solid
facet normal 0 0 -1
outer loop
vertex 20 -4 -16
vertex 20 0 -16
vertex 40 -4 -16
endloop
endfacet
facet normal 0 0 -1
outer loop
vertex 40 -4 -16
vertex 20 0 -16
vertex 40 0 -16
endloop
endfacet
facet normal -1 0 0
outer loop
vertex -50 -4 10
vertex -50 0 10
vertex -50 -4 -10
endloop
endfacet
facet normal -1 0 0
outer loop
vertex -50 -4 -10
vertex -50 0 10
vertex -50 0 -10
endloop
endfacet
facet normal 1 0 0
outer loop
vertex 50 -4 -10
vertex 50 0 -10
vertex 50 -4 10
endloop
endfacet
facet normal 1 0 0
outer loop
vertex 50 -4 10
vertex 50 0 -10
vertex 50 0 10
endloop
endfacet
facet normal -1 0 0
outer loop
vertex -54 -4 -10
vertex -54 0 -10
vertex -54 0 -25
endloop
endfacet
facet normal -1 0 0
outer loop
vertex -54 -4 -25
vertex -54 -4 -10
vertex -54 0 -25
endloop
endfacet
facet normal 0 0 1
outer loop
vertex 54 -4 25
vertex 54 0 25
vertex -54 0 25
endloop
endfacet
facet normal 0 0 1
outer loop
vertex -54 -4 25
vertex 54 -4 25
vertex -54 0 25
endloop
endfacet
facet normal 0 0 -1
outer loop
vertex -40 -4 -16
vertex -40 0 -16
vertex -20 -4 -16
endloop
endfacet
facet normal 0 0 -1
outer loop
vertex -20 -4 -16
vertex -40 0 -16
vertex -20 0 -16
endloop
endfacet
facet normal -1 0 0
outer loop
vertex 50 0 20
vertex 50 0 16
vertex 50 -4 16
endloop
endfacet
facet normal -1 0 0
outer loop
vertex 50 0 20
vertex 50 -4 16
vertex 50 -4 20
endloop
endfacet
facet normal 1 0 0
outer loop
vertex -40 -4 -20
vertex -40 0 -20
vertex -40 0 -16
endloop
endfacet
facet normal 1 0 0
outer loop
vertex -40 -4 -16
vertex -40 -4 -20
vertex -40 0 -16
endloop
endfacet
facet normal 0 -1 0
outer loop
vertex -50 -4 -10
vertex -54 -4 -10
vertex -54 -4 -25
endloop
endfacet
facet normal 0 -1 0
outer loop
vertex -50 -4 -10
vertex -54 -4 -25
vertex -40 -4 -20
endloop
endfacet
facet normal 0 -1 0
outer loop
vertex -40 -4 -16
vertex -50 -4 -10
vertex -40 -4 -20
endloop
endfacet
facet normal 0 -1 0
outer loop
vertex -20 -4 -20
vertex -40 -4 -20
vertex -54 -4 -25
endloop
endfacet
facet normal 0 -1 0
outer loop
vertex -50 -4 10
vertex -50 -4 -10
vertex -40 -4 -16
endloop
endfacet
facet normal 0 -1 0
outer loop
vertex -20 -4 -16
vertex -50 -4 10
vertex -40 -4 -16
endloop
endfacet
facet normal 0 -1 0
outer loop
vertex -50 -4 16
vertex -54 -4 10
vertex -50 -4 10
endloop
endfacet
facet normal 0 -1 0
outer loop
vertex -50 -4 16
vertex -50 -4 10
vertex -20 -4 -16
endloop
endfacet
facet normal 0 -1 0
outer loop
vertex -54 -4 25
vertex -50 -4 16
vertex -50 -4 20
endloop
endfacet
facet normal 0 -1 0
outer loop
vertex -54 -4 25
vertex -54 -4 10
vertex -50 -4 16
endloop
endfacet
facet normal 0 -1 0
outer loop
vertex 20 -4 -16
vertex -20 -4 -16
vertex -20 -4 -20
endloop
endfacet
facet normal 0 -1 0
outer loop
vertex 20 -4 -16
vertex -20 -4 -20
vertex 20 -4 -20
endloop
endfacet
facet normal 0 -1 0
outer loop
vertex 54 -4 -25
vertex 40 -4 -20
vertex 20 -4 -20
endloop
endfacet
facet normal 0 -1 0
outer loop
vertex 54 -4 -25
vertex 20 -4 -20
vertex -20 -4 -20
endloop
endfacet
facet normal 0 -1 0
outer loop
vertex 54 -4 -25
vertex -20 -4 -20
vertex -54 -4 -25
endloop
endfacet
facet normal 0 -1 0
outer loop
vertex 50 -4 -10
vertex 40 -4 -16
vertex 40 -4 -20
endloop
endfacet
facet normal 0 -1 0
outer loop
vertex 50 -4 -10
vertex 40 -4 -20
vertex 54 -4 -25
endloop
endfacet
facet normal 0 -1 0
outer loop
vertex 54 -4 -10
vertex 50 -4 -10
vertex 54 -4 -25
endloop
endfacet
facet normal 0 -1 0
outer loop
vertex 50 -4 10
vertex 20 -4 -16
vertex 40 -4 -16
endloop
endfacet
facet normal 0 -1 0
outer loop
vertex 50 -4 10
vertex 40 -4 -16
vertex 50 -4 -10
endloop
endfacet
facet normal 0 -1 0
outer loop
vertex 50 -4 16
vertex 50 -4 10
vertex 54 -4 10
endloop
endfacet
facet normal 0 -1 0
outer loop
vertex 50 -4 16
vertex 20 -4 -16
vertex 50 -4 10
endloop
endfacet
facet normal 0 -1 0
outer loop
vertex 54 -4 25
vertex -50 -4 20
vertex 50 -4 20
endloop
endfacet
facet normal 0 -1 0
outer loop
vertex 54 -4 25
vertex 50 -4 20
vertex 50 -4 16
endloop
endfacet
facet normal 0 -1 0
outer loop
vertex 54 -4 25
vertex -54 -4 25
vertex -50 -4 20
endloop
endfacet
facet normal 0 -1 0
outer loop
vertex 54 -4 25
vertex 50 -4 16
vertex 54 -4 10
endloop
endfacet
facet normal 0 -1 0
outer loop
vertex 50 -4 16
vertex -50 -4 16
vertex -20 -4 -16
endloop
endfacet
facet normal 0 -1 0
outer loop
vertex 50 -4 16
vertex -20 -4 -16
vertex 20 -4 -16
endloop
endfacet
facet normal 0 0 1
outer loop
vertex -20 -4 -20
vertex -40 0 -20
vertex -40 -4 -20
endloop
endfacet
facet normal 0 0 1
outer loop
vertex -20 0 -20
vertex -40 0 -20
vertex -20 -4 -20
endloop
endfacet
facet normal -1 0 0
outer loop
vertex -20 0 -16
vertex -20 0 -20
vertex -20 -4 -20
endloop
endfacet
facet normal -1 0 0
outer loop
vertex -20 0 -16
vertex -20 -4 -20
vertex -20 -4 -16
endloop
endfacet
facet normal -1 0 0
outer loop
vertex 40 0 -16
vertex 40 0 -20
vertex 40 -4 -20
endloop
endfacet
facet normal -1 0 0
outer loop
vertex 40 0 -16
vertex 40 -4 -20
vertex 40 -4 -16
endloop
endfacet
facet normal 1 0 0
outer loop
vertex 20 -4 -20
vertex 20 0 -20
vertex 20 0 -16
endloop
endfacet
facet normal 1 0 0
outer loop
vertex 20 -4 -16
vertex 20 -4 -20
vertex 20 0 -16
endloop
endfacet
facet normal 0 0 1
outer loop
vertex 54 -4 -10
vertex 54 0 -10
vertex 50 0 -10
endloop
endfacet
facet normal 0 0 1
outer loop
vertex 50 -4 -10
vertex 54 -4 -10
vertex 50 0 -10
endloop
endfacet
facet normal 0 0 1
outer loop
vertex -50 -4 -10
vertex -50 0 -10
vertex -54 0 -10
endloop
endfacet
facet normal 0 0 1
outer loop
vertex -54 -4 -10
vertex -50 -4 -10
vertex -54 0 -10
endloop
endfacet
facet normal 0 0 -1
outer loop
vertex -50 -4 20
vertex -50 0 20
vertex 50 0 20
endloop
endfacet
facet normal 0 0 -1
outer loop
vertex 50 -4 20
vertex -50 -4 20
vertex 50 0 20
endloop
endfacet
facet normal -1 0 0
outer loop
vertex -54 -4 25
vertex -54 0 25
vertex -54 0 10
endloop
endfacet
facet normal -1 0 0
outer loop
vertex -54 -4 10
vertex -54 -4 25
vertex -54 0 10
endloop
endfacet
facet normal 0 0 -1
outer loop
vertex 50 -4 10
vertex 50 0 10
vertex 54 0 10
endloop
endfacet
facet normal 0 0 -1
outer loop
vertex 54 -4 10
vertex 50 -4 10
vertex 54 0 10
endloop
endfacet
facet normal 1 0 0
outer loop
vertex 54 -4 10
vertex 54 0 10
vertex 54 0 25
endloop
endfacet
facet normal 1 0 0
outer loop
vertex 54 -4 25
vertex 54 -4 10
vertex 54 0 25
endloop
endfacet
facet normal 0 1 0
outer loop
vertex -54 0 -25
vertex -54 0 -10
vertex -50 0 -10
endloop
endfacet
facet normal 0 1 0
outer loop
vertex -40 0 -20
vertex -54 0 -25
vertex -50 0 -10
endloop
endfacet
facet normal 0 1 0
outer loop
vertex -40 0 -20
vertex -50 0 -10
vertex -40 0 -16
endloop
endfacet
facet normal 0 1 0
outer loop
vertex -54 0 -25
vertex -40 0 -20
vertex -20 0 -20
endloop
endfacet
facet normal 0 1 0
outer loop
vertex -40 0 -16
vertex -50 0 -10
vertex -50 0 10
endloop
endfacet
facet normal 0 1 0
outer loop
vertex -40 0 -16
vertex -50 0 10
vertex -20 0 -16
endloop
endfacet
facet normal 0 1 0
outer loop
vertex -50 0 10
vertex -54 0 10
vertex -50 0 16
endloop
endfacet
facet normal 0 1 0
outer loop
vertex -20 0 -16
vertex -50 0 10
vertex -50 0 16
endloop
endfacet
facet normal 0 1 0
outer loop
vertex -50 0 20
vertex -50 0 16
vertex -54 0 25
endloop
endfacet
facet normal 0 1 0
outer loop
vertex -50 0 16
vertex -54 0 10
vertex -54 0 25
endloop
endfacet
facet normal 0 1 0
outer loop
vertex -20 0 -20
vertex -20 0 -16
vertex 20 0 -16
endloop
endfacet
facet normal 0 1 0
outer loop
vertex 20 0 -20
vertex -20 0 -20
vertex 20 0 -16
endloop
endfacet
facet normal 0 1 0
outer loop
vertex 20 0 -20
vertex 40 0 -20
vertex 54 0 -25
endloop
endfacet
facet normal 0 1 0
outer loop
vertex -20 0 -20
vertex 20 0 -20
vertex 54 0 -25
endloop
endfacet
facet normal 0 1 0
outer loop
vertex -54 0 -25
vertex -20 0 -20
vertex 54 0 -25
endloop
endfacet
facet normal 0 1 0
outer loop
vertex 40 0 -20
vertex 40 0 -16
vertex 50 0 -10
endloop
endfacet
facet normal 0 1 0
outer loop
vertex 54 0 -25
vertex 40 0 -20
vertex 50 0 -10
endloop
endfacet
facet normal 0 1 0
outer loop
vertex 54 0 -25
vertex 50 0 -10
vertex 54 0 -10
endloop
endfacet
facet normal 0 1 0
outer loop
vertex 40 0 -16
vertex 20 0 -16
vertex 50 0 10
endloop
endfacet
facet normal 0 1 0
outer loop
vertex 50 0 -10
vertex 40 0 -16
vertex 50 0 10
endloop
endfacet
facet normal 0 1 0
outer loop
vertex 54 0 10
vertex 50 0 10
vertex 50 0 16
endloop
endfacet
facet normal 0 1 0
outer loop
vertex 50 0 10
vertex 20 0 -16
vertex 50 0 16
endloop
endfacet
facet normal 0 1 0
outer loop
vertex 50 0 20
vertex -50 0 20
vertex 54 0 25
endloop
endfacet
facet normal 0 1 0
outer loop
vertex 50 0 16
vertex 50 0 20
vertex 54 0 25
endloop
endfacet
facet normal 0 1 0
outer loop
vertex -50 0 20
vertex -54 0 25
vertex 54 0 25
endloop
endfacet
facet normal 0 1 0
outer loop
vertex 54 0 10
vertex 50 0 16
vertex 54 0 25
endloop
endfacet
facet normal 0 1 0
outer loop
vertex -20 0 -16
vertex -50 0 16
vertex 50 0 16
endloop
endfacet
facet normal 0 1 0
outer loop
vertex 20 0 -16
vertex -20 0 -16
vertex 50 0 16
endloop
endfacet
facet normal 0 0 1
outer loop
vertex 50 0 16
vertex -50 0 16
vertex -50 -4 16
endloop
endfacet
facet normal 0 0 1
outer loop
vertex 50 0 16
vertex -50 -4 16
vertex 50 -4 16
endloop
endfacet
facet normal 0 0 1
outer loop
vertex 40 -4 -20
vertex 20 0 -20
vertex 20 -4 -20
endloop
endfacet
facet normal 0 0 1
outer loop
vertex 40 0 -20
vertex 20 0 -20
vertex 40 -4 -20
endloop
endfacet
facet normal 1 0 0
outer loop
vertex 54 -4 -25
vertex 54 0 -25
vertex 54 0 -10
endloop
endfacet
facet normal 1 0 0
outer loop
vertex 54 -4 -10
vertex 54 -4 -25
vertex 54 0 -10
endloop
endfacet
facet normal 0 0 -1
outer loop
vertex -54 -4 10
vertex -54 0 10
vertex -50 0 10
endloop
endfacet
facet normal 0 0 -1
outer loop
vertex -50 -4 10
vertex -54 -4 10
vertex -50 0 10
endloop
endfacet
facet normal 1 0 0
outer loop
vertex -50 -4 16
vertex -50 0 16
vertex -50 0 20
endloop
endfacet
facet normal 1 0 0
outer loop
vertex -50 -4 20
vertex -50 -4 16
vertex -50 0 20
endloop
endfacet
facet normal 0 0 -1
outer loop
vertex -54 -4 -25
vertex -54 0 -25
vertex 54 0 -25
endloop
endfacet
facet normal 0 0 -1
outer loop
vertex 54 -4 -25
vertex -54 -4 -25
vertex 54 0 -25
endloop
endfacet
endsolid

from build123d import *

# Parameters (mm, degrees)
F0_W     = 20
F0_H     = 4
F0_W_2   = 100
F1_DEPTH = 4


with BuildPart() as f1:
    # F0 (on Front) → F1 (new body)
    with BuildSketch(Plane.XZ):
        Polygon((54, 10), (54, 25), (-54, 25), (-54, 10), (-50, 10), (-50, -10), (-54, -10), (-54, -25), (54, -25), (54, -10), (50, -10), (50, 10), align=None)
        with Locations((-30, -18)):
            Rectangle(F0_W, F0_H, mode=Mode.SUBTRACT)
        with Locations((30, -18)):
            Rectangle(F0_W, F0_H, mode=Mode.SUBTRACT)
        with Locations((0, 18)):
            Rectangle(F0_W_2, F0_H, mode=Mode.SUBTRACT)
    extrude(amount=F1_DEPTH)


solid = f1.part
